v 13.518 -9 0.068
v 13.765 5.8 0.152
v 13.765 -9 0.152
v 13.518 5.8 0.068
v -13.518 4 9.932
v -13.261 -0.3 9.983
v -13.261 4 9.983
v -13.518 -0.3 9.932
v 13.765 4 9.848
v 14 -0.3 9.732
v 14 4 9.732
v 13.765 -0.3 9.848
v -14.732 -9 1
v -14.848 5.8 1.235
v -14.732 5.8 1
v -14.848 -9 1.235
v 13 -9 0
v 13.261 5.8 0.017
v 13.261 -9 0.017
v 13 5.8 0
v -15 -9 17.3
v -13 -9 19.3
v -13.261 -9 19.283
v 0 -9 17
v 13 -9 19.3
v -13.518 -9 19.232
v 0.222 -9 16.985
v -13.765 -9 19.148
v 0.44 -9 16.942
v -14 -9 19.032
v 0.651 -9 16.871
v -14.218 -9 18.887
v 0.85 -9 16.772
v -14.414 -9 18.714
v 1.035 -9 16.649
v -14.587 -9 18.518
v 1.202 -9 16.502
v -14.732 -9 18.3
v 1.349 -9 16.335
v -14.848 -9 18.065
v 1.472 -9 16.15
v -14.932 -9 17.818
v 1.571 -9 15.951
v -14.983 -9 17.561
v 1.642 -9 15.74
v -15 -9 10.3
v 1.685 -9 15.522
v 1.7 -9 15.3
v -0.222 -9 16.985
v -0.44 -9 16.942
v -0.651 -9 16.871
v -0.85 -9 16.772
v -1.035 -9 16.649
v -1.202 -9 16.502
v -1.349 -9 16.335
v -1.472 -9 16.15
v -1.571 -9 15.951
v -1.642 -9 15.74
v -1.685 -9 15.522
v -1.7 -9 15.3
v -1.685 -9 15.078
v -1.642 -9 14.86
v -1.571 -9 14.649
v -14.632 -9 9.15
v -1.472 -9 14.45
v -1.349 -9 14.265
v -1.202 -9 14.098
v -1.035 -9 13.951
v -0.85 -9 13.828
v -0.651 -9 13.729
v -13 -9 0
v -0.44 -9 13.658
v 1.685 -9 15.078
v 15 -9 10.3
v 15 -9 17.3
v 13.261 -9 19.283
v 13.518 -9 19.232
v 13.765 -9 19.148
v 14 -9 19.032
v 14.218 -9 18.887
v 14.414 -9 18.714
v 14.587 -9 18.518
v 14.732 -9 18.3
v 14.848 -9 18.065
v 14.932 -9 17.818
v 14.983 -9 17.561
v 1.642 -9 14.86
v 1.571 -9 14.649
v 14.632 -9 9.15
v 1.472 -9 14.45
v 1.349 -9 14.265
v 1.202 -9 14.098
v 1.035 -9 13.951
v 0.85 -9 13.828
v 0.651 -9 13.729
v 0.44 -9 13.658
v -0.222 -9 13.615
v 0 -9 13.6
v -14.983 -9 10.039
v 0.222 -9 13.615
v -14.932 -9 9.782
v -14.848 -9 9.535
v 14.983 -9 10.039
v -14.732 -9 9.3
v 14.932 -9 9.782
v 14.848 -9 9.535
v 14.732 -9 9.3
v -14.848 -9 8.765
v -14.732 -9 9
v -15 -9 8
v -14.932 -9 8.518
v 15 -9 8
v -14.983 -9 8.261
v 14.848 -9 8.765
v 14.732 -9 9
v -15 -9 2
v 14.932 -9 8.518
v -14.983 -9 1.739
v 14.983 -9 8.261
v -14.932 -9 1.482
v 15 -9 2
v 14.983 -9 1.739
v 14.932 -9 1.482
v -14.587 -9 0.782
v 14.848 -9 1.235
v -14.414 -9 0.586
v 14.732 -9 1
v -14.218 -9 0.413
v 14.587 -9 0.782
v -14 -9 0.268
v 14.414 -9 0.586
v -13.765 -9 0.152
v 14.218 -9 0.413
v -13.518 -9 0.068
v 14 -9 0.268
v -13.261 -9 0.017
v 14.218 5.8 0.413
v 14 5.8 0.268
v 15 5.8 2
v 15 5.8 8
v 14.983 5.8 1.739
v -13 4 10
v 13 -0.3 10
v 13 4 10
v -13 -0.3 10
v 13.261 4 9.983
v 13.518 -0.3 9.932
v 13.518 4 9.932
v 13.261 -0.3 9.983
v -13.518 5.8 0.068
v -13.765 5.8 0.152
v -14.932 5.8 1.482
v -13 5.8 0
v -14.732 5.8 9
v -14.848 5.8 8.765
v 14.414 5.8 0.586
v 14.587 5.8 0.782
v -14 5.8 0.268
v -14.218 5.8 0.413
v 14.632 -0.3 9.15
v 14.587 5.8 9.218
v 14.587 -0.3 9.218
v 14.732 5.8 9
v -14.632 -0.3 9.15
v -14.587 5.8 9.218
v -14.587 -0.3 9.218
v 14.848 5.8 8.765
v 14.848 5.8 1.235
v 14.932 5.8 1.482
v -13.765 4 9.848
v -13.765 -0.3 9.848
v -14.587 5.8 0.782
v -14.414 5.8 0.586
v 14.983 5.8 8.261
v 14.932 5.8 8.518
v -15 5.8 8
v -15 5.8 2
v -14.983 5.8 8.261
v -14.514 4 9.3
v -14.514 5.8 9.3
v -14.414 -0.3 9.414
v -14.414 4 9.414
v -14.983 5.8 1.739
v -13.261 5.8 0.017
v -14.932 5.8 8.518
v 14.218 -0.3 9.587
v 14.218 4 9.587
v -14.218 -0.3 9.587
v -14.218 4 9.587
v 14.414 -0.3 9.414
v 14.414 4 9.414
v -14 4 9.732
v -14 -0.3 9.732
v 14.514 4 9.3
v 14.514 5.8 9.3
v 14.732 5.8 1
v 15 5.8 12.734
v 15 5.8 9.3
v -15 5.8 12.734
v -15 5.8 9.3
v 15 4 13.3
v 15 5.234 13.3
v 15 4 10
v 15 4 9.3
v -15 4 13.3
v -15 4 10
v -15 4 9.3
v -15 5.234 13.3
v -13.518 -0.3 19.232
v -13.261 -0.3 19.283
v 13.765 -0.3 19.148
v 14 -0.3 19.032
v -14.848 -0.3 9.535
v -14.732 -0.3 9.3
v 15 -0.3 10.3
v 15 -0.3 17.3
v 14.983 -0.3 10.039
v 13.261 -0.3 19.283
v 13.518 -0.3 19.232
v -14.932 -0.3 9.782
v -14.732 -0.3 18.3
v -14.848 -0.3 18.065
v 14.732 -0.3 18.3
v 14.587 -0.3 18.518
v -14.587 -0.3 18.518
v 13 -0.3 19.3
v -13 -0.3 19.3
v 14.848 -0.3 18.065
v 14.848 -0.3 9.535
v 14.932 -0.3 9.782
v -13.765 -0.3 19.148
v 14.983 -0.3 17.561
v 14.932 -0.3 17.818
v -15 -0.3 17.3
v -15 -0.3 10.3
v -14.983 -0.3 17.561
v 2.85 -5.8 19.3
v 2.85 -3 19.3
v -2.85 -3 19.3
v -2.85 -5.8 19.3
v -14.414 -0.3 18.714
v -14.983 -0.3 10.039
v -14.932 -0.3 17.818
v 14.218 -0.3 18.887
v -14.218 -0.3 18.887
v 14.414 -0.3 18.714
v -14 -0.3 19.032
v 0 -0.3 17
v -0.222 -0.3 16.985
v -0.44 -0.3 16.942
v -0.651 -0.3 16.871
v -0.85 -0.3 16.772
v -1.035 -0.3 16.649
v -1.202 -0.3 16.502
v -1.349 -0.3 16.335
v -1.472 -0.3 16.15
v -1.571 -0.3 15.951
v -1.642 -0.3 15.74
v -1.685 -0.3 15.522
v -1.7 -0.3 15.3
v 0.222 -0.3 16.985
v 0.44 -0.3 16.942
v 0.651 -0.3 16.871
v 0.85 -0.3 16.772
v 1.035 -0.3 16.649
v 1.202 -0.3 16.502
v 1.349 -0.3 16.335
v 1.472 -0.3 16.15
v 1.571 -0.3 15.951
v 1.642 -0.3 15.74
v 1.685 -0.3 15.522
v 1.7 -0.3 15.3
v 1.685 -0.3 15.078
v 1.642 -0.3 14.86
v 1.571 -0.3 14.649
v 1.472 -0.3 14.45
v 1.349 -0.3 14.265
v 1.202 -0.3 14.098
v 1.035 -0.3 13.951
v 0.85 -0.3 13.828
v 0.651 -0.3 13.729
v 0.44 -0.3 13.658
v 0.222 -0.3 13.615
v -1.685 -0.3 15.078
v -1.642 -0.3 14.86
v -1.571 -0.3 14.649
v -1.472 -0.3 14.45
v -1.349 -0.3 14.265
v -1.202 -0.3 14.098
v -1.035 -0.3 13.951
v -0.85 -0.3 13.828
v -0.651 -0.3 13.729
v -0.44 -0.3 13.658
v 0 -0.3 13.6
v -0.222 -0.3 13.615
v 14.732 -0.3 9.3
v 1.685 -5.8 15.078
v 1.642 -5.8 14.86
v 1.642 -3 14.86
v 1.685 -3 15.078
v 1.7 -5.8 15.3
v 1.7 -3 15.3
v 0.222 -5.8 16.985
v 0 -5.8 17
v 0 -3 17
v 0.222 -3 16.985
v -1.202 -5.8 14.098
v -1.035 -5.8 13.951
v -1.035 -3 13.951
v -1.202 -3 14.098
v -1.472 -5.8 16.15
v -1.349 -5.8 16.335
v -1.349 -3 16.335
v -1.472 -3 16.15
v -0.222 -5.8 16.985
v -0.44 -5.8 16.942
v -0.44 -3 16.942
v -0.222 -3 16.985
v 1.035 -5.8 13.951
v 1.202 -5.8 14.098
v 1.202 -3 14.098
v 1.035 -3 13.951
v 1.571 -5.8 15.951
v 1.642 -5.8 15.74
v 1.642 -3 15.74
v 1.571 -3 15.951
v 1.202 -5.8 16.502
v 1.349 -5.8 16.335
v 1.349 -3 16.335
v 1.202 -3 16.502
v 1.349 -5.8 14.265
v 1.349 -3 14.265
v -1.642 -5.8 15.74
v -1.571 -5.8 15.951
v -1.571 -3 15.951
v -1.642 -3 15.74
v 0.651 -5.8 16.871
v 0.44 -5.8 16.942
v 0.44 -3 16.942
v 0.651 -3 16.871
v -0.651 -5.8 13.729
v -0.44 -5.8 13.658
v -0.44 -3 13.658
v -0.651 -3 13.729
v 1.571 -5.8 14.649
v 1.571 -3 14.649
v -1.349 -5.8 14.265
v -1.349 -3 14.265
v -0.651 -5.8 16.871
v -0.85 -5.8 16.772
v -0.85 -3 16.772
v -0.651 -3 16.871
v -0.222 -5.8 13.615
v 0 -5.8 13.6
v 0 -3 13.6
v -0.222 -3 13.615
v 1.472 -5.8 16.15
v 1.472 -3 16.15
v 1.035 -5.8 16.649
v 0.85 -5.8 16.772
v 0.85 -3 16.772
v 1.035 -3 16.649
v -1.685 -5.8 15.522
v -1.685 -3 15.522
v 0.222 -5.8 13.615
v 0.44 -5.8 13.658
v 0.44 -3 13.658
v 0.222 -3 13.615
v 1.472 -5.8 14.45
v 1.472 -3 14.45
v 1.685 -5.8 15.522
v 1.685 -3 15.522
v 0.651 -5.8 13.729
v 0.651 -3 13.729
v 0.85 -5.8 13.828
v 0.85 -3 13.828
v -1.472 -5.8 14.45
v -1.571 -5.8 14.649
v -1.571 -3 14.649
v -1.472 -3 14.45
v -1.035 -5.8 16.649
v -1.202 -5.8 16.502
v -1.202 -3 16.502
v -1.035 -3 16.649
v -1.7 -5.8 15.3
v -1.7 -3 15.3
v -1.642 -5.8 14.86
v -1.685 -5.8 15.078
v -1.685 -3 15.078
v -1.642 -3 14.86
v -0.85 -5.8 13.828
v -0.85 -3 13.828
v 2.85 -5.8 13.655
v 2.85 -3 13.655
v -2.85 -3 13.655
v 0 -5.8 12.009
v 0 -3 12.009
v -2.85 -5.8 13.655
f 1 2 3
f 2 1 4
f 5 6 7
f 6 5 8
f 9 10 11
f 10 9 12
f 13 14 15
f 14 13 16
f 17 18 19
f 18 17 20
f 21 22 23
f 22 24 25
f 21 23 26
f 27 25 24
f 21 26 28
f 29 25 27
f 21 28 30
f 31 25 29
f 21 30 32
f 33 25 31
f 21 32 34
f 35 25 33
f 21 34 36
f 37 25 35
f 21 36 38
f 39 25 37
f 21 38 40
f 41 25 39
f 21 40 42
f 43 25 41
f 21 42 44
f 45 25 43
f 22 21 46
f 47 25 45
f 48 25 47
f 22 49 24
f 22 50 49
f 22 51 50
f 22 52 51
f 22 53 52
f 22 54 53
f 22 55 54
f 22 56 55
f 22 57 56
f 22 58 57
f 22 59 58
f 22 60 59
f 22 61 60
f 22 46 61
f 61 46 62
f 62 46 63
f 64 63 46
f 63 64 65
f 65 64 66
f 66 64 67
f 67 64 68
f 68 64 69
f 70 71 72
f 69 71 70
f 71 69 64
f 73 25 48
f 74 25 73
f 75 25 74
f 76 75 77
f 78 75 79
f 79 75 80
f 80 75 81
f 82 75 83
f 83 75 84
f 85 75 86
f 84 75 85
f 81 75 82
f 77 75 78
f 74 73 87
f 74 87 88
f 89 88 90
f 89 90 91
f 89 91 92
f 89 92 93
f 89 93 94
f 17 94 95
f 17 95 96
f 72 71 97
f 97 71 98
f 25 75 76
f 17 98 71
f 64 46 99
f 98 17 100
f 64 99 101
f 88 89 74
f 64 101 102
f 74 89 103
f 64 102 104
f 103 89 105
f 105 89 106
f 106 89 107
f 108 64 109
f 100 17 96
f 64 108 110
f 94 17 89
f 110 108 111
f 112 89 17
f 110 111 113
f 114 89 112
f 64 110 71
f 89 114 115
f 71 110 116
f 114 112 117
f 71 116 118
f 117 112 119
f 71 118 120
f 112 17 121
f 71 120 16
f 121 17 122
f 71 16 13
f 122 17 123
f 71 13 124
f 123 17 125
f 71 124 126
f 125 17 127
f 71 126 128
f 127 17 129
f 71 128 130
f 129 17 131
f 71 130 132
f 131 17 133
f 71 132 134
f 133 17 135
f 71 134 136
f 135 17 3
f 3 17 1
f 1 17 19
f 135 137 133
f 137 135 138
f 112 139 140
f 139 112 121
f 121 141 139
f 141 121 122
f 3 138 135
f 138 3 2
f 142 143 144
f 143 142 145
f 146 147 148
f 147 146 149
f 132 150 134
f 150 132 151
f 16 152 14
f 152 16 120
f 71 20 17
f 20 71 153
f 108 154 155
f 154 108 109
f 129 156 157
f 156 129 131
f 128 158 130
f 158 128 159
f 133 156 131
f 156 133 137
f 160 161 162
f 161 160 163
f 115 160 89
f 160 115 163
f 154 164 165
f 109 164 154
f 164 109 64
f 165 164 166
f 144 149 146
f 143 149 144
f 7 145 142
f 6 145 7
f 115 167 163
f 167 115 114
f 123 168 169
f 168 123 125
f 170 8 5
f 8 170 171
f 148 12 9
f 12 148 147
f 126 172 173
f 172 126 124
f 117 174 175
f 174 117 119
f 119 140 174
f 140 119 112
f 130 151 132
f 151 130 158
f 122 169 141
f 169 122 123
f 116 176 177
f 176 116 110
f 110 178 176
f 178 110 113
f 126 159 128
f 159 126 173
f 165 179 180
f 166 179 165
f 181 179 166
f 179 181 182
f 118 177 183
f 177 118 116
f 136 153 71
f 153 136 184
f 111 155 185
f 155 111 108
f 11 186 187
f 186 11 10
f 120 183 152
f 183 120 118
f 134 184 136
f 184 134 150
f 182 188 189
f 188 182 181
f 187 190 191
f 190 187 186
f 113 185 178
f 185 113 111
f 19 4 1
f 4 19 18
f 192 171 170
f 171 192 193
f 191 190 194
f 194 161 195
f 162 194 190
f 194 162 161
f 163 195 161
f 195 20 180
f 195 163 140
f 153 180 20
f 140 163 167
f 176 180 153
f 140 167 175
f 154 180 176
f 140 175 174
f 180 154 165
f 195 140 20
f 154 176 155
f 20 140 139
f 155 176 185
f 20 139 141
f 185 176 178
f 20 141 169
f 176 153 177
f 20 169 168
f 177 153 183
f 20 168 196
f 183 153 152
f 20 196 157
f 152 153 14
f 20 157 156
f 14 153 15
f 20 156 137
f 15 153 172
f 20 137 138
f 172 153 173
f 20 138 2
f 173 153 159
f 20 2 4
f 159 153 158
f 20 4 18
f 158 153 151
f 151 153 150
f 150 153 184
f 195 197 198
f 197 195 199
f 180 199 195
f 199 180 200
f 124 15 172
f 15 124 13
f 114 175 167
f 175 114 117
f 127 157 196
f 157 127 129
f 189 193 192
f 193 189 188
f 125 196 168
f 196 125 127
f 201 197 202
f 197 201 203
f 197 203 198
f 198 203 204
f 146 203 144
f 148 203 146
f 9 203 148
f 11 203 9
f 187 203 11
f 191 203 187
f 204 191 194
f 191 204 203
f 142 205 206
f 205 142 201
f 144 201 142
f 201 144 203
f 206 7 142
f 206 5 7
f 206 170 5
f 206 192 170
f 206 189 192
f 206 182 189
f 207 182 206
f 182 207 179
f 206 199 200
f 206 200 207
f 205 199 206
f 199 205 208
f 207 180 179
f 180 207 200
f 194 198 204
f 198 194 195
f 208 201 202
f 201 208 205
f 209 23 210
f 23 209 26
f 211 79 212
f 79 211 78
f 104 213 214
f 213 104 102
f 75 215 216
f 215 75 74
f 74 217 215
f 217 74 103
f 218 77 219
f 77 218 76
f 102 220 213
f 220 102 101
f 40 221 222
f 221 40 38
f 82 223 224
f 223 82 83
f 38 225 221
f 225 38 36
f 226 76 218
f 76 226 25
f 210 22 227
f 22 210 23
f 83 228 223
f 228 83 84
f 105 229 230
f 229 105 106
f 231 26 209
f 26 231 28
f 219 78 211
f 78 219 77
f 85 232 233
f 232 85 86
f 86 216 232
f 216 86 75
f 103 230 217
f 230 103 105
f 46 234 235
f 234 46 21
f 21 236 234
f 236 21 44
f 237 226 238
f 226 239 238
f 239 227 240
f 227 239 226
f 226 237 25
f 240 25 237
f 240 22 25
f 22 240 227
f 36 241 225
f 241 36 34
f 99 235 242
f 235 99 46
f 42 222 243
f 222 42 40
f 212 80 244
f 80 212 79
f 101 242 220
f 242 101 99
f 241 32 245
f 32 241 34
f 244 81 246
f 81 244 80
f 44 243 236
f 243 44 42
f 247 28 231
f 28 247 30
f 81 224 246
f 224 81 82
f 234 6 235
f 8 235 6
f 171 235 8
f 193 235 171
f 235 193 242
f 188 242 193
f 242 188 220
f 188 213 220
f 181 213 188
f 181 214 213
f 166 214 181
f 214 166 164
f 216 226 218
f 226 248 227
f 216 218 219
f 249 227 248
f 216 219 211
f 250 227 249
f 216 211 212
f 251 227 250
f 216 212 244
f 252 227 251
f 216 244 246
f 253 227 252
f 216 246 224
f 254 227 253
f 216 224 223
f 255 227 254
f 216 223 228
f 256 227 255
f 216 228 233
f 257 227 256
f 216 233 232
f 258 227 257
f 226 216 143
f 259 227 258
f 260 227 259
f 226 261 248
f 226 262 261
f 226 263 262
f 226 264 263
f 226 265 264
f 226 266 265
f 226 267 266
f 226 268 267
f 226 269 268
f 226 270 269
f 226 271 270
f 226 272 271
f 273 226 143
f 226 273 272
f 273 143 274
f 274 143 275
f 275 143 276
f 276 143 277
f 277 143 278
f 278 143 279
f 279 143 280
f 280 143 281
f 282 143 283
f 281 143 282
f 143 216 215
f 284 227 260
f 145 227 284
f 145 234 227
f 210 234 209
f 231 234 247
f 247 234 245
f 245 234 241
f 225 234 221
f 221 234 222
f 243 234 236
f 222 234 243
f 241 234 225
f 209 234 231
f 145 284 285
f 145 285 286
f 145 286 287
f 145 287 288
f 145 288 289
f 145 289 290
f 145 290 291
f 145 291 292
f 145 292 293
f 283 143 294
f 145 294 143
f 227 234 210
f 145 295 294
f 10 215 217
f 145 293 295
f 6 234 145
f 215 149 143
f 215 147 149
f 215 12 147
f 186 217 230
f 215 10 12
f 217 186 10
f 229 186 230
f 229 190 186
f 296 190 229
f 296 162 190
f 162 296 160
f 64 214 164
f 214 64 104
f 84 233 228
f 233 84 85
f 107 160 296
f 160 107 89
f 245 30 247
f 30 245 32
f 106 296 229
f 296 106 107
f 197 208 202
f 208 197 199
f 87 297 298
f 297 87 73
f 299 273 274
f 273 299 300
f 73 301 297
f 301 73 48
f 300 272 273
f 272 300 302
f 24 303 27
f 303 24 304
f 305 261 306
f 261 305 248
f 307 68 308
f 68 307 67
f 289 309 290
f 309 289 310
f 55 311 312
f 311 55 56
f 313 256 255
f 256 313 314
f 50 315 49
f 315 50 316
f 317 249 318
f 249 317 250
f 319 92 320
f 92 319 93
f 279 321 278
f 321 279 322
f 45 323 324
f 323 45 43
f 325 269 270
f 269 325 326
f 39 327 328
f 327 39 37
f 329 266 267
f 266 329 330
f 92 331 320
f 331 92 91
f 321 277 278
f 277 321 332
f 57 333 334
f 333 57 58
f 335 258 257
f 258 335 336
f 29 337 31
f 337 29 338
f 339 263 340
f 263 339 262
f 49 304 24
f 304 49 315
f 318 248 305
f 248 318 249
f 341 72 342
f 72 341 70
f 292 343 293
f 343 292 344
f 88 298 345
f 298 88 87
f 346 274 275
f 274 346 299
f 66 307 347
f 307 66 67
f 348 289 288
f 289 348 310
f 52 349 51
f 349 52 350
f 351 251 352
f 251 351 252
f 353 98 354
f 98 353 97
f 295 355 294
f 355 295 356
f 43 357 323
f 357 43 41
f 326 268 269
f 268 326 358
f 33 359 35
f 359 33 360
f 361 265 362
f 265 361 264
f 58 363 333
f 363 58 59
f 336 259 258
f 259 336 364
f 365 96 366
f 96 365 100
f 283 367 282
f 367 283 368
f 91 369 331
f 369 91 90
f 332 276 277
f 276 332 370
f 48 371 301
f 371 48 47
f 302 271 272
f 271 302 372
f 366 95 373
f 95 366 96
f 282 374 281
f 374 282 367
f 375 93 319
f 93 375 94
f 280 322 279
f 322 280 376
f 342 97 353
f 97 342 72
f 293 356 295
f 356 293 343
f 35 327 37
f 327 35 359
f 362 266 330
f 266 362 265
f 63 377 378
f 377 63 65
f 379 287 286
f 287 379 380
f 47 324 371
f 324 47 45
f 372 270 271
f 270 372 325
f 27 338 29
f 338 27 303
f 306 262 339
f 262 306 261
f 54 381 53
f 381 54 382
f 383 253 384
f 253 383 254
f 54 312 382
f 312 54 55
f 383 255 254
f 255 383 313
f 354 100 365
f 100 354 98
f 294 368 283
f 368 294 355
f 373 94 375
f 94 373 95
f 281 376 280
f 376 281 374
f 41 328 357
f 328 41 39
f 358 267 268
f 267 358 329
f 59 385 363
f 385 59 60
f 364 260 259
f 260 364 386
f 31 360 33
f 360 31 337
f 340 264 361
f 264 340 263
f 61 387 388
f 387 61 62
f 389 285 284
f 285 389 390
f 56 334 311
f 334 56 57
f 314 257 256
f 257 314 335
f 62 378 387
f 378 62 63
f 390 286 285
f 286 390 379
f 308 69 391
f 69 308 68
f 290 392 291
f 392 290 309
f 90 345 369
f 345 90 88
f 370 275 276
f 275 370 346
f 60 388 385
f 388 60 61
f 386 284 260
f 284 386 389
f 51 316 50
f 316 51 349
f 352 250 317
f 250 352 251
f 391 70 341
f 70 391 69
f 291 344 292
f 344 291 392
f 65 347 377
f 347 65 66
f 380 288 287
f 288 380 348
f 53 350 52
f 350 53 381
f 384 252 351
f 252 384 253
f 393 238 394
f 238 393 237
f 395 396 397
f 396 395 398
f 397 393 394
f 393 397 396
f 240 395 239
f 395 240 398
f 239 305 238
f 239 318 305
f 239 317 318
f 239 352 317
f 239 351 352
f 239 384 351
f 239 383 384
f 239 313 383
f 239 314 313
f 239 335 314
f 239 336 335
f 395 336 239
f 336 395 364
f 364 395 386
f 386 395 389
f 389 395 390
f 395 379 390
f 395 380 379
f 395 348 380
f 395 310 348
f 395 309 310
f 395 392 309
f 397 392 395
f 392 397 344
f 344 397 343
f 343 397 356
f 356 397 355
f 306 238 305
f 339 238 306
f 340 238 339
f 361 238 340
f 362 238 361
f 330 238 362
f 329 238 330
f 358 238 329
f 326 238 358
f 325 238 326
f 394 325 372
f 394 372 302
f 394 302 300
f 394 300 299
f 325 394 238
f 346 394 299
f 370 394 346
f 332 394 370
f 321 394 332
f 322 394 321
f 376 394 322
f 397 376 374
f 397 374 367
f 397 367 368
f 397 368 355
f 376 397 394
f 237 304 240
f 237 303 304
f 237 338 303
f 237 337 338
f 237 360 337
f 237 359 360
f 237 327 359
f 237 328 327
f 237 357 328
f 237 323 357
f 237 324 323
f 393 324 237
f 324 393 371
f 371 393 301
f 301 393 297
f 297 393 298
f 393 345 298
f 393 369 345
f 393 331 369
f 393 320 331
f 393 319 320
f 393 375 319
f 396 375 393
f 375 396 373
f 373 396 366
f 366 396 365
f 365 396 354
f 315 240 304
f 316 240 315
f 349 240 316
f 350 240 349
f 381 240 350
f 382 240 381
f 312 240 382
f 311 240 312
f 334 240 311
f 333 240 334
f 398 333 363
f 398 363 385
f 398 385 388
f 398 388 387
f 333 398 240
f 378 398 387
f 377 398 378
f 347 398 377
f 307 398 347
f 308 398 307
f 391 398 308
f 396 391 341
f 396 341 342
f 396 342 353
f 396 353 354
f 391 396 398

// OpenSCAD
// file: lib/comun.scad
// =====================================================================
// AutoSwapEnder3Pro - parametros y utilidades comunes de las piezas
// Licencia MIT. Unidades: milimetros.
//
// Sistema de coordenadas de la ESTACION (el mismo en todas las piezas que
// se montan en ella):
//   s : a lo largo de la estacion, 0 = HOME del carro, crece hacia la impresora
//   x : a lo ancho, 0 = eje central (riel lineal), +x = lado de la caja de descarga
//   z : vertical, 0 = cara superior de la base de perfiles 2020 ("b" en la guia)
// El plano de transferencia (superficie por la que se deslizan las placas)
// esta en z = PLANO. Se ajusta a la altura de la cama de la impresora con las
// patas niveladoras, NO cambiando estas piezas.
// =====================================================================

$fn = 48;

// ----------------------------------------------------- placas y cama
placa_ancho  = 235;     // placa PEI
placa_largo  = 235;
placa_esp    = 0.6;     // espesor real de tus placas (mide con calibrador; 0.5 a 0.75)
voladizo     = 11;      // cuanto sobresale la placa (o su lengüeta) por delante de la cama

// ----------------------------------------------------- estacion (alturas sobre la base)
PLANO        = 60;      // plano de transferencia sobre la cara superior de la base
RIEL_SUP     = 20;      // cara superior del riel lineal (2020 apoyado en los travesaños)
ZP           = PLANO - RIEL_SUP;  // = 40: plano de transferencia sobre el riel lineal

// zapata (debe coincidir con zapata.scad)
zapata_bajo  = 8;       // cuanto cuelga la zapata por debajo de la placa
zapata_bolsillo = 6;    // profundidad del bolsillo para el dedo (desde abajo)

// cargador (ascensor)
paso_estante = 14;      // distancia vertical entre placas en el cargador
niveles      = 6;       // placas que caben en el cargador

// ----------------------------------------------------- perfil y tornilleria
perfil      = 20;       // perfil de aluminio 2020
ranura_ancho = 6.2;     // boca de la ranura (serie 20)
holgura     = 0.3;      // holgura general de impresion

m2_paso     = 1.8;   // agujero para autorroscante M2 (servos)
m3          = 3.4;   // paso libre M3
m3_rosca    = 2.7;   // para roscar M3 directamente en plastico
m3_tuerca   = 5.7;   // M3: entre caras + holgura
m3_tuerca_h = 2.6;
m3_cabeza   = 6.2;
m4          = 4.4;
m5          = 5.4;   // paso libre M5
m5_cabeza   = 9.2;
m5_tuerca   = 8.2;   // M5: entre caras + holgura

// ruedas en V estandar (Openbuilds "Solid V Wheel" + rodamientos 625)
rueda_d      = 23.9;
rueda_ancho  = 10.2;
rueda_sep    = 39.26;   // distancia entre centros de ruedas a ambos lados de un 2020
excentrica_d = 7.2;     // alojamiento del espaciador excentrico
espaciador_h = 6;       // espaciador (excentrico o fijo) entre rueda y placa

// ----------------------------------------------------- utilidades

// Caja con aristas verticales redondeadas (r) apoyada en z=0.
module caja_r(size, r = 2) {
  r2 = min(r, size[0] / 2 - 0.01, size[1] / 2 - 0.01);
  hull() for (ix = [r2, size[0] - r2], iy = [r2, size[1] - r2])
    translate([ix, iy, 0]) cylinder(r = r2, h = size[2]);
}

// Igual pero centrada en x e y.
module caja_rc(size, r = 2) { translate([-size[0] / 2, -size[1] / 2, 0]) caja_r(size, r); }

// Prisma hexagonal para tuercas (ec = medida entre caras).
module hexagono(ec, h) { cylinder(d = ec / cos(30), h = h, $fn = 6); }

// Ranura (agujero alargado) a lo largo de x.
module ranura(largo, d, h) {
  hull() for (i = [-largo / 2, largo / 2]) translate([i, 0, 0]) cylinder(d = d, h = h);
}

// Taladro M5 con avellanado para la cabeza (para atornillar a un perfil con tuerca en T).
module taladro_m5(h, cabeza = 4) {
  translate([0, 0, -0.1]) cylinder(d = m5, h = h + 0.2);
  translate([0, 0, h - cabeza]) cylinder(d = m5_cabeza + 0.6, h = cabeza + 0.1);
}

// Taladro M3 pasante con alojamiento de tuerca hexagonal por debajo.
module taladro_m3_tuerca(h, prof_tuerca = m3_tuerca_h + 0.2) {
  translate([0, 0, -0.1]) cylinder(d = m3, h = h + 0.2);
  translate([0, 0, -0.1]) hexagono(m3_tuerca, prof_tuerca + 0.1);
}

// Perfil 2020 de referencia (solo para ensamble y comprobaciones visuales).
module perfil2020(largo) {
  difference() {
    translate([-10, -10, 0]) cube([20, 20, largo]);
    for (a = [0, 90, 180, 270]) rotate([0, 0, a])
      translate([10 - 1.8, -ranura_ancho / 2, -1]) cube([2, ranura_ancho, largo + 2]);
    translate([0, 0, -1]) cylinder(d = 4.2, h = largo + 2);
  }
}

// Microinterruptor KW11-3Z con palanca de rodillo (referencia: 20 x 6.4 x 10 mm,
// taladros M2 a 9.5 mm). Agujeros de montaje, con la cara de montaje en z=0.
module taladros_kw11(h = 10) {
  for (i = [-4.75, 4.75]) translate([i, 0, -0.1]) cylinder(d = 2.2, h = h + 0.2);
}
// main file
// =====================================================================
// TOPE TRASERO - se pinza al borde trasero de la cama (imprimir 2, se
// colocan a +-70 mm del centro, lejos de la salida del cable de la cama)
// Material: ABS o ASA (la cama llega a 60-100 °C). 4 perimetros, 40 %.
//
// La placa nueva se empuja hasta tocar la CARA DE TOPE: eso fija su
// posicion en Y. La mordaza superior apoya 3 mm sobre la base magnetica y
// sobresale 1.8 mm; un tornillo M3 por debajo aprieta contra el aluminio.
//
// Coordenadas: y = 0 en el borde trasero de la cama, y < 0 hacia el frente,
// z = 0 en la cara inferior del aluminio de la cama.
// =====================================================================
include <lib/comun.scad>

cama_esp   = 3.0;   // espesor del aluminio (mide el tuyo: Anexo A, A9)
base_mag   = 1.0;   // espesor de la base magnetica
adelanto   = 3;     // la mordaza superior entra 3 mm sobre la base magnetica
alto_tope  = 1.8;   // cuanto sobresale la cara de tope sobre la base magnetica
ancho      = 30;
fondo      = 10;    // bloque por detras del borde de la cama
mord_inf   = 9;     // largo de la mordaza inferior bajo la cama
bajo       = 9;     // grueso por debajo de la cama
tornillo_y = -5;

z_mag = cama_esp + base_mag;
z_top = z_mag + alto_tope;

module tope() {
  difference() {
    union() {
      // bloque trasero
      translate([-ancho / 2, 0.3, -bajo]) caja_r([ancho, fondo, bajo + z_top], 2);
      // mordaza superior = cara de tope
      translate([-ancho / 2, -adelanto, z_mag]) cube([ancho, adelanto + 1, alto_tope]);
      // mordaza inferior
      translate([-ancho / 2, -mord_inf, -bajo]) caja_r([ancho, mord_inf + 2, bajo - 0.3], 2);
    }
    // ranura donde entra el canto de la cama (con holgura)
    translate([-ancho / 2 - 1, -mord_inf - 1, -0.3]) cube([ancho + 2, mord_inf + 1.3, z_mag + 0.3]);
    // chaflan en la arista superior de la cara de tope (guia la placa)
    translate([0, -adelanto, z_top]) rotate([45, 0, 0]) cube([ancho + 2, 0.8, 0.8], center = true);
    // tornillo de apriete M3 desde abajo + tuerca
    translate([0, tornillo_y, -bajo - 0.1]) cylinder(d = m3, h = bajo + 0.2);
    translate([0, tornillo_y, -bajo / 2 - m3_tuerca_h / 2]) rotate([0, 0, 30]) hexagono(m3_tuerca, m3_tuerca_h + 0.2);
    translate([-m3_tuerca / 2, tornillo_y - mord_inf, -bajo / 2 - m3_tuerca_h / 2]) cube([m3_tuerca, mord_inf, m3_tuerca_h + 0.2]);
  }
}

// Orientacion de impresion: apoyado sobre la cara trasera (sin soportes)
rotate([-90, 0, 0]) translate([0, -fondo - 0.3, 0]) tope();
